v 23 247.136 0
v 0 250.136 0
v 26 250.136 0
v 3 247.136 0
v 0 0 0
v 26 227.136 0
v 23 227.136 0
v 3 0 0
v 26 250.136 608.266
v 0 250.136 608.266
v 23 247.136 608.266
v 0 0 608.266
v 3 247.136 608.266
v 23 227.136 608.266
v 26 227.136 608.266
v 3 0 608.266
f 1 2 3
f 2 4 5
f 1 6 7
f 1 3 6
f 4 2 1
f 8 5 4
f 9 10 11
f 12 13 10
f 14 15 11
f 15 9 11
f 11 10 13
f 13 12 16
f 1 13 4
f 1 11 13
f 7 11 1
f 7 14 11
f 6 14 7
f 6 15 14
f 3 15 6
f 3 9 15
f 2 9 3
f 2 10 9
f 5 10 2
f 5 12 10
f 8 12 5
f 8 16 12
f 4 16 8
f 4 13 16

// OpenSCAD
/* Developed by Alex Grutter */

$fn = 36;

//triangle_side_plate(10, 10, 30, 10);

MILS_TO_MM = 0.0254;


eli156_iphw_length = 14.41 + 101.57 + 215.138 + (8470 * MILS_TO_MM) + 47.6 + 14.41;
eli156_iphw_width  = 13.95 + 19.22 + (4540 * MILS_TO_MM) + 81.65 + 20;

J_channel_plate(3, eli156_iphw_length, eli156_iphw_width, 20, 20);

/******************************************************************************
* J-shaped Plate
******************************************************************************/
module J_channel_plate(thickness, length, width, j_channel_width, j_channel_depth)
{
	point_ax = 0;
	point_ay = 0;
	point_bx = 0;
	point_by = width;
	point_cx = j_channel_width + (2 * thickness);
	point_cy = width;
	point_dx = j_channel_width + (2 * thickness);
	point_dy = width - j_channel_depth - thickness;
	point_ex = j_channel_width + thickness;
	point_ey = width - j_channel_depth - thickness;
	point_fx = j_channel_width + thickness;
	point_fy = width - thickness;
	point_gx = thickness;
	point_gy = width - thickness;
	point_hx = thickness;
	point_hy = 0;

	//translate([0,-(length / 2),width])
	//rotate([-90,0,0])
	linear_extrude(height = length)
	polygon([[point_ax, point_ay], [point_bx, point_by], [point_cx, point_cy], [point_dx, point_dy], [point_ex, point_ey], [point_fx, point_fy], [point_gx, point_gy], [point_hx, point_hy]]);
}

/******************************************************************************
* H-shaped Plate
******************************************************************************/
module H_shaped_plate(thickness, outer_length, outer_width, inner_length, inner_offset_width_1, inner_offset_width_2)
{
	length_offset  = 	(outer_length - inner_length) / 2;
	width_offset_1 =	(outer_width - inner_offset_width_1);
	width_offset_2 =	0;
	linear_extrude(height = thickness)
	
	difference()
	{
		square([outer_length, outer_width]);
		
		translate([length_offset,width_offset_1,0])
		square([inner_length, inner_offset_width_1]);

		translate([length_offset,0,0])
		square([inner_length, inner_offset_width_2]);
	}
}

/******************************************************************************
* Triangular Side Plate
******************************************************************************/
module triangle_side_plate(length, width, angle, thickness, hole)
{	
	/* Use right triangle trig to find values */
	h = width * sin(angle);
	l1 = sqrt((width ^ 2)-(h ^ 2));
	l2 = length - l1;
	w2 = sqrt((l2 ^ 2) + (h ^ 2));

	/* Find the other angles */
	b = asin(h / w2);
	a1 = 90 - angle;
	a2 = 90 - b;
	a3 = (a2 - a1) / 2;
	a = a1 + a2;
	
	outer_point1_x = 0;
	outer_point1_y = 0;
	outer_point2_x = 0;
	outer_point2_y = length;
	outer_point3_x = width * sin(angle);
	outer_point3_y = width * cos(angle);
	
	inner_point1_x = outer_point1_x + thickness;
	inner_point1_y = outer_point1_y + thickness / tan(angle / 2);
	inner_point2_x = outer_point2_x + thickness;
	inner_point2_y = outer_point2_y - (thickness / tan(b / 2));
	inner_point3_x = outer_point3_x - ((thickness / sin(a / 2)) * cos(a3));
	inner_point3_y = outer_point3_y + ((thickness / sin(a / 2)) * sin(a3));
	
	/*
	echo(outer_point1_x - inner_point1_x);
	echo(outer_point2_x - inner_point2_x);
	echo(outer_point3_x - inner_point3_x);
	
	echo(outer_point1_y - inner_point1_y);
	echo(outer_point2_y - inner_point2_y);
	echo(outer_point3_y - inner_point3_y);
	*/
	
	rotate([0,-90,0])
	linear_extrude(height = thickness)
	difference()
	{
		polygon([[outer_point1_x, outer_point1_y], [outer_point2_x, outer_point2_y], [outer_point3_x, outer_point3_y]]);
		
		/* Only cut out center if there is room */
		if(hole && (inner_point3_x > inner_point2_x))
		{
			polygon([[inner_point1_x, inner_point1_y], [inner_point2_x, inner_point2_y], [inner_point3_x, inner_point3_y]]);
		}
	}
}

/******************************************************************************
* V-shaped Side Plate
******************************************************************************/
module v_side_plate(length, width, angle, thickness, hole)
{	
	/* Use right triangle trig to find values */
	h = width * sin(angle);
	l1 = sqrt((width ^ 2)-(h ^ 2));
	l2 = length - l1;
	w2 = sqrt((l2 ^ 2) + (h ^ 2));

	/* Find the other angles */
	b = asin(h / w2);
	a1 = 90 - angle;
	a2 = 90 - b;
	a3 = (a2 - a1) / 2;
	a = a1 + a2;
	
	outer_point1_x = 0;
	outer_point1_y = 0;
	outer_point2_x = 0;
	outer_point2_y = length;
	outer_point3_x = width * sin(angle);
	outer_point3_y = width * cos(angle);
	
	inner_point1_x = outer_point1_x + thickness;
	inner_point1_y = outer_point1_y + thickness / tan(angle / 2);
	inner_point2_x = outer_point2_x + thickness;
	inner_point2_y = outer_point2_y - (thickness / tan(b / 2));
	inner_point3_x = outer_point3_x - ((thickness / sin(a / 2)) * cos(a3));
	inner_point3_y = outer_point3_y + ((thickness / sin(a / 2)) * sin(a3));
	
	/*
	echo(outer_point1_x - inner_point1_x);
	echo(outer_point2_x - inner_point2_x);
	echo(outer_point3_x - inner_point3_x);
	
	echo(outer_point1_y - inner_point1_y);
	echo(outer_point2_y - inner_point2_y);
	echo(outer_point3_y - inner_point3_y);
	*/
	
	rotate([0,-90,0])
	linear_extrude(height = thickness)
	difference()
	{
		polygon([[outer_point1_x, outer_point1_y], [outer_point2_x, outer_point2_y], [outer_point3_x, outer_point3_y]]);
		
		/* Only cut out center if there is room */
		if(hole && (inner_point3_x > inner_point2_x))
		{
			polygon([[inner_point1_x, inner_point1_y], [inner_point2_x, inner_point2_y], [inner_point3_x, inner_point3_y]]);
		}
	}
}
